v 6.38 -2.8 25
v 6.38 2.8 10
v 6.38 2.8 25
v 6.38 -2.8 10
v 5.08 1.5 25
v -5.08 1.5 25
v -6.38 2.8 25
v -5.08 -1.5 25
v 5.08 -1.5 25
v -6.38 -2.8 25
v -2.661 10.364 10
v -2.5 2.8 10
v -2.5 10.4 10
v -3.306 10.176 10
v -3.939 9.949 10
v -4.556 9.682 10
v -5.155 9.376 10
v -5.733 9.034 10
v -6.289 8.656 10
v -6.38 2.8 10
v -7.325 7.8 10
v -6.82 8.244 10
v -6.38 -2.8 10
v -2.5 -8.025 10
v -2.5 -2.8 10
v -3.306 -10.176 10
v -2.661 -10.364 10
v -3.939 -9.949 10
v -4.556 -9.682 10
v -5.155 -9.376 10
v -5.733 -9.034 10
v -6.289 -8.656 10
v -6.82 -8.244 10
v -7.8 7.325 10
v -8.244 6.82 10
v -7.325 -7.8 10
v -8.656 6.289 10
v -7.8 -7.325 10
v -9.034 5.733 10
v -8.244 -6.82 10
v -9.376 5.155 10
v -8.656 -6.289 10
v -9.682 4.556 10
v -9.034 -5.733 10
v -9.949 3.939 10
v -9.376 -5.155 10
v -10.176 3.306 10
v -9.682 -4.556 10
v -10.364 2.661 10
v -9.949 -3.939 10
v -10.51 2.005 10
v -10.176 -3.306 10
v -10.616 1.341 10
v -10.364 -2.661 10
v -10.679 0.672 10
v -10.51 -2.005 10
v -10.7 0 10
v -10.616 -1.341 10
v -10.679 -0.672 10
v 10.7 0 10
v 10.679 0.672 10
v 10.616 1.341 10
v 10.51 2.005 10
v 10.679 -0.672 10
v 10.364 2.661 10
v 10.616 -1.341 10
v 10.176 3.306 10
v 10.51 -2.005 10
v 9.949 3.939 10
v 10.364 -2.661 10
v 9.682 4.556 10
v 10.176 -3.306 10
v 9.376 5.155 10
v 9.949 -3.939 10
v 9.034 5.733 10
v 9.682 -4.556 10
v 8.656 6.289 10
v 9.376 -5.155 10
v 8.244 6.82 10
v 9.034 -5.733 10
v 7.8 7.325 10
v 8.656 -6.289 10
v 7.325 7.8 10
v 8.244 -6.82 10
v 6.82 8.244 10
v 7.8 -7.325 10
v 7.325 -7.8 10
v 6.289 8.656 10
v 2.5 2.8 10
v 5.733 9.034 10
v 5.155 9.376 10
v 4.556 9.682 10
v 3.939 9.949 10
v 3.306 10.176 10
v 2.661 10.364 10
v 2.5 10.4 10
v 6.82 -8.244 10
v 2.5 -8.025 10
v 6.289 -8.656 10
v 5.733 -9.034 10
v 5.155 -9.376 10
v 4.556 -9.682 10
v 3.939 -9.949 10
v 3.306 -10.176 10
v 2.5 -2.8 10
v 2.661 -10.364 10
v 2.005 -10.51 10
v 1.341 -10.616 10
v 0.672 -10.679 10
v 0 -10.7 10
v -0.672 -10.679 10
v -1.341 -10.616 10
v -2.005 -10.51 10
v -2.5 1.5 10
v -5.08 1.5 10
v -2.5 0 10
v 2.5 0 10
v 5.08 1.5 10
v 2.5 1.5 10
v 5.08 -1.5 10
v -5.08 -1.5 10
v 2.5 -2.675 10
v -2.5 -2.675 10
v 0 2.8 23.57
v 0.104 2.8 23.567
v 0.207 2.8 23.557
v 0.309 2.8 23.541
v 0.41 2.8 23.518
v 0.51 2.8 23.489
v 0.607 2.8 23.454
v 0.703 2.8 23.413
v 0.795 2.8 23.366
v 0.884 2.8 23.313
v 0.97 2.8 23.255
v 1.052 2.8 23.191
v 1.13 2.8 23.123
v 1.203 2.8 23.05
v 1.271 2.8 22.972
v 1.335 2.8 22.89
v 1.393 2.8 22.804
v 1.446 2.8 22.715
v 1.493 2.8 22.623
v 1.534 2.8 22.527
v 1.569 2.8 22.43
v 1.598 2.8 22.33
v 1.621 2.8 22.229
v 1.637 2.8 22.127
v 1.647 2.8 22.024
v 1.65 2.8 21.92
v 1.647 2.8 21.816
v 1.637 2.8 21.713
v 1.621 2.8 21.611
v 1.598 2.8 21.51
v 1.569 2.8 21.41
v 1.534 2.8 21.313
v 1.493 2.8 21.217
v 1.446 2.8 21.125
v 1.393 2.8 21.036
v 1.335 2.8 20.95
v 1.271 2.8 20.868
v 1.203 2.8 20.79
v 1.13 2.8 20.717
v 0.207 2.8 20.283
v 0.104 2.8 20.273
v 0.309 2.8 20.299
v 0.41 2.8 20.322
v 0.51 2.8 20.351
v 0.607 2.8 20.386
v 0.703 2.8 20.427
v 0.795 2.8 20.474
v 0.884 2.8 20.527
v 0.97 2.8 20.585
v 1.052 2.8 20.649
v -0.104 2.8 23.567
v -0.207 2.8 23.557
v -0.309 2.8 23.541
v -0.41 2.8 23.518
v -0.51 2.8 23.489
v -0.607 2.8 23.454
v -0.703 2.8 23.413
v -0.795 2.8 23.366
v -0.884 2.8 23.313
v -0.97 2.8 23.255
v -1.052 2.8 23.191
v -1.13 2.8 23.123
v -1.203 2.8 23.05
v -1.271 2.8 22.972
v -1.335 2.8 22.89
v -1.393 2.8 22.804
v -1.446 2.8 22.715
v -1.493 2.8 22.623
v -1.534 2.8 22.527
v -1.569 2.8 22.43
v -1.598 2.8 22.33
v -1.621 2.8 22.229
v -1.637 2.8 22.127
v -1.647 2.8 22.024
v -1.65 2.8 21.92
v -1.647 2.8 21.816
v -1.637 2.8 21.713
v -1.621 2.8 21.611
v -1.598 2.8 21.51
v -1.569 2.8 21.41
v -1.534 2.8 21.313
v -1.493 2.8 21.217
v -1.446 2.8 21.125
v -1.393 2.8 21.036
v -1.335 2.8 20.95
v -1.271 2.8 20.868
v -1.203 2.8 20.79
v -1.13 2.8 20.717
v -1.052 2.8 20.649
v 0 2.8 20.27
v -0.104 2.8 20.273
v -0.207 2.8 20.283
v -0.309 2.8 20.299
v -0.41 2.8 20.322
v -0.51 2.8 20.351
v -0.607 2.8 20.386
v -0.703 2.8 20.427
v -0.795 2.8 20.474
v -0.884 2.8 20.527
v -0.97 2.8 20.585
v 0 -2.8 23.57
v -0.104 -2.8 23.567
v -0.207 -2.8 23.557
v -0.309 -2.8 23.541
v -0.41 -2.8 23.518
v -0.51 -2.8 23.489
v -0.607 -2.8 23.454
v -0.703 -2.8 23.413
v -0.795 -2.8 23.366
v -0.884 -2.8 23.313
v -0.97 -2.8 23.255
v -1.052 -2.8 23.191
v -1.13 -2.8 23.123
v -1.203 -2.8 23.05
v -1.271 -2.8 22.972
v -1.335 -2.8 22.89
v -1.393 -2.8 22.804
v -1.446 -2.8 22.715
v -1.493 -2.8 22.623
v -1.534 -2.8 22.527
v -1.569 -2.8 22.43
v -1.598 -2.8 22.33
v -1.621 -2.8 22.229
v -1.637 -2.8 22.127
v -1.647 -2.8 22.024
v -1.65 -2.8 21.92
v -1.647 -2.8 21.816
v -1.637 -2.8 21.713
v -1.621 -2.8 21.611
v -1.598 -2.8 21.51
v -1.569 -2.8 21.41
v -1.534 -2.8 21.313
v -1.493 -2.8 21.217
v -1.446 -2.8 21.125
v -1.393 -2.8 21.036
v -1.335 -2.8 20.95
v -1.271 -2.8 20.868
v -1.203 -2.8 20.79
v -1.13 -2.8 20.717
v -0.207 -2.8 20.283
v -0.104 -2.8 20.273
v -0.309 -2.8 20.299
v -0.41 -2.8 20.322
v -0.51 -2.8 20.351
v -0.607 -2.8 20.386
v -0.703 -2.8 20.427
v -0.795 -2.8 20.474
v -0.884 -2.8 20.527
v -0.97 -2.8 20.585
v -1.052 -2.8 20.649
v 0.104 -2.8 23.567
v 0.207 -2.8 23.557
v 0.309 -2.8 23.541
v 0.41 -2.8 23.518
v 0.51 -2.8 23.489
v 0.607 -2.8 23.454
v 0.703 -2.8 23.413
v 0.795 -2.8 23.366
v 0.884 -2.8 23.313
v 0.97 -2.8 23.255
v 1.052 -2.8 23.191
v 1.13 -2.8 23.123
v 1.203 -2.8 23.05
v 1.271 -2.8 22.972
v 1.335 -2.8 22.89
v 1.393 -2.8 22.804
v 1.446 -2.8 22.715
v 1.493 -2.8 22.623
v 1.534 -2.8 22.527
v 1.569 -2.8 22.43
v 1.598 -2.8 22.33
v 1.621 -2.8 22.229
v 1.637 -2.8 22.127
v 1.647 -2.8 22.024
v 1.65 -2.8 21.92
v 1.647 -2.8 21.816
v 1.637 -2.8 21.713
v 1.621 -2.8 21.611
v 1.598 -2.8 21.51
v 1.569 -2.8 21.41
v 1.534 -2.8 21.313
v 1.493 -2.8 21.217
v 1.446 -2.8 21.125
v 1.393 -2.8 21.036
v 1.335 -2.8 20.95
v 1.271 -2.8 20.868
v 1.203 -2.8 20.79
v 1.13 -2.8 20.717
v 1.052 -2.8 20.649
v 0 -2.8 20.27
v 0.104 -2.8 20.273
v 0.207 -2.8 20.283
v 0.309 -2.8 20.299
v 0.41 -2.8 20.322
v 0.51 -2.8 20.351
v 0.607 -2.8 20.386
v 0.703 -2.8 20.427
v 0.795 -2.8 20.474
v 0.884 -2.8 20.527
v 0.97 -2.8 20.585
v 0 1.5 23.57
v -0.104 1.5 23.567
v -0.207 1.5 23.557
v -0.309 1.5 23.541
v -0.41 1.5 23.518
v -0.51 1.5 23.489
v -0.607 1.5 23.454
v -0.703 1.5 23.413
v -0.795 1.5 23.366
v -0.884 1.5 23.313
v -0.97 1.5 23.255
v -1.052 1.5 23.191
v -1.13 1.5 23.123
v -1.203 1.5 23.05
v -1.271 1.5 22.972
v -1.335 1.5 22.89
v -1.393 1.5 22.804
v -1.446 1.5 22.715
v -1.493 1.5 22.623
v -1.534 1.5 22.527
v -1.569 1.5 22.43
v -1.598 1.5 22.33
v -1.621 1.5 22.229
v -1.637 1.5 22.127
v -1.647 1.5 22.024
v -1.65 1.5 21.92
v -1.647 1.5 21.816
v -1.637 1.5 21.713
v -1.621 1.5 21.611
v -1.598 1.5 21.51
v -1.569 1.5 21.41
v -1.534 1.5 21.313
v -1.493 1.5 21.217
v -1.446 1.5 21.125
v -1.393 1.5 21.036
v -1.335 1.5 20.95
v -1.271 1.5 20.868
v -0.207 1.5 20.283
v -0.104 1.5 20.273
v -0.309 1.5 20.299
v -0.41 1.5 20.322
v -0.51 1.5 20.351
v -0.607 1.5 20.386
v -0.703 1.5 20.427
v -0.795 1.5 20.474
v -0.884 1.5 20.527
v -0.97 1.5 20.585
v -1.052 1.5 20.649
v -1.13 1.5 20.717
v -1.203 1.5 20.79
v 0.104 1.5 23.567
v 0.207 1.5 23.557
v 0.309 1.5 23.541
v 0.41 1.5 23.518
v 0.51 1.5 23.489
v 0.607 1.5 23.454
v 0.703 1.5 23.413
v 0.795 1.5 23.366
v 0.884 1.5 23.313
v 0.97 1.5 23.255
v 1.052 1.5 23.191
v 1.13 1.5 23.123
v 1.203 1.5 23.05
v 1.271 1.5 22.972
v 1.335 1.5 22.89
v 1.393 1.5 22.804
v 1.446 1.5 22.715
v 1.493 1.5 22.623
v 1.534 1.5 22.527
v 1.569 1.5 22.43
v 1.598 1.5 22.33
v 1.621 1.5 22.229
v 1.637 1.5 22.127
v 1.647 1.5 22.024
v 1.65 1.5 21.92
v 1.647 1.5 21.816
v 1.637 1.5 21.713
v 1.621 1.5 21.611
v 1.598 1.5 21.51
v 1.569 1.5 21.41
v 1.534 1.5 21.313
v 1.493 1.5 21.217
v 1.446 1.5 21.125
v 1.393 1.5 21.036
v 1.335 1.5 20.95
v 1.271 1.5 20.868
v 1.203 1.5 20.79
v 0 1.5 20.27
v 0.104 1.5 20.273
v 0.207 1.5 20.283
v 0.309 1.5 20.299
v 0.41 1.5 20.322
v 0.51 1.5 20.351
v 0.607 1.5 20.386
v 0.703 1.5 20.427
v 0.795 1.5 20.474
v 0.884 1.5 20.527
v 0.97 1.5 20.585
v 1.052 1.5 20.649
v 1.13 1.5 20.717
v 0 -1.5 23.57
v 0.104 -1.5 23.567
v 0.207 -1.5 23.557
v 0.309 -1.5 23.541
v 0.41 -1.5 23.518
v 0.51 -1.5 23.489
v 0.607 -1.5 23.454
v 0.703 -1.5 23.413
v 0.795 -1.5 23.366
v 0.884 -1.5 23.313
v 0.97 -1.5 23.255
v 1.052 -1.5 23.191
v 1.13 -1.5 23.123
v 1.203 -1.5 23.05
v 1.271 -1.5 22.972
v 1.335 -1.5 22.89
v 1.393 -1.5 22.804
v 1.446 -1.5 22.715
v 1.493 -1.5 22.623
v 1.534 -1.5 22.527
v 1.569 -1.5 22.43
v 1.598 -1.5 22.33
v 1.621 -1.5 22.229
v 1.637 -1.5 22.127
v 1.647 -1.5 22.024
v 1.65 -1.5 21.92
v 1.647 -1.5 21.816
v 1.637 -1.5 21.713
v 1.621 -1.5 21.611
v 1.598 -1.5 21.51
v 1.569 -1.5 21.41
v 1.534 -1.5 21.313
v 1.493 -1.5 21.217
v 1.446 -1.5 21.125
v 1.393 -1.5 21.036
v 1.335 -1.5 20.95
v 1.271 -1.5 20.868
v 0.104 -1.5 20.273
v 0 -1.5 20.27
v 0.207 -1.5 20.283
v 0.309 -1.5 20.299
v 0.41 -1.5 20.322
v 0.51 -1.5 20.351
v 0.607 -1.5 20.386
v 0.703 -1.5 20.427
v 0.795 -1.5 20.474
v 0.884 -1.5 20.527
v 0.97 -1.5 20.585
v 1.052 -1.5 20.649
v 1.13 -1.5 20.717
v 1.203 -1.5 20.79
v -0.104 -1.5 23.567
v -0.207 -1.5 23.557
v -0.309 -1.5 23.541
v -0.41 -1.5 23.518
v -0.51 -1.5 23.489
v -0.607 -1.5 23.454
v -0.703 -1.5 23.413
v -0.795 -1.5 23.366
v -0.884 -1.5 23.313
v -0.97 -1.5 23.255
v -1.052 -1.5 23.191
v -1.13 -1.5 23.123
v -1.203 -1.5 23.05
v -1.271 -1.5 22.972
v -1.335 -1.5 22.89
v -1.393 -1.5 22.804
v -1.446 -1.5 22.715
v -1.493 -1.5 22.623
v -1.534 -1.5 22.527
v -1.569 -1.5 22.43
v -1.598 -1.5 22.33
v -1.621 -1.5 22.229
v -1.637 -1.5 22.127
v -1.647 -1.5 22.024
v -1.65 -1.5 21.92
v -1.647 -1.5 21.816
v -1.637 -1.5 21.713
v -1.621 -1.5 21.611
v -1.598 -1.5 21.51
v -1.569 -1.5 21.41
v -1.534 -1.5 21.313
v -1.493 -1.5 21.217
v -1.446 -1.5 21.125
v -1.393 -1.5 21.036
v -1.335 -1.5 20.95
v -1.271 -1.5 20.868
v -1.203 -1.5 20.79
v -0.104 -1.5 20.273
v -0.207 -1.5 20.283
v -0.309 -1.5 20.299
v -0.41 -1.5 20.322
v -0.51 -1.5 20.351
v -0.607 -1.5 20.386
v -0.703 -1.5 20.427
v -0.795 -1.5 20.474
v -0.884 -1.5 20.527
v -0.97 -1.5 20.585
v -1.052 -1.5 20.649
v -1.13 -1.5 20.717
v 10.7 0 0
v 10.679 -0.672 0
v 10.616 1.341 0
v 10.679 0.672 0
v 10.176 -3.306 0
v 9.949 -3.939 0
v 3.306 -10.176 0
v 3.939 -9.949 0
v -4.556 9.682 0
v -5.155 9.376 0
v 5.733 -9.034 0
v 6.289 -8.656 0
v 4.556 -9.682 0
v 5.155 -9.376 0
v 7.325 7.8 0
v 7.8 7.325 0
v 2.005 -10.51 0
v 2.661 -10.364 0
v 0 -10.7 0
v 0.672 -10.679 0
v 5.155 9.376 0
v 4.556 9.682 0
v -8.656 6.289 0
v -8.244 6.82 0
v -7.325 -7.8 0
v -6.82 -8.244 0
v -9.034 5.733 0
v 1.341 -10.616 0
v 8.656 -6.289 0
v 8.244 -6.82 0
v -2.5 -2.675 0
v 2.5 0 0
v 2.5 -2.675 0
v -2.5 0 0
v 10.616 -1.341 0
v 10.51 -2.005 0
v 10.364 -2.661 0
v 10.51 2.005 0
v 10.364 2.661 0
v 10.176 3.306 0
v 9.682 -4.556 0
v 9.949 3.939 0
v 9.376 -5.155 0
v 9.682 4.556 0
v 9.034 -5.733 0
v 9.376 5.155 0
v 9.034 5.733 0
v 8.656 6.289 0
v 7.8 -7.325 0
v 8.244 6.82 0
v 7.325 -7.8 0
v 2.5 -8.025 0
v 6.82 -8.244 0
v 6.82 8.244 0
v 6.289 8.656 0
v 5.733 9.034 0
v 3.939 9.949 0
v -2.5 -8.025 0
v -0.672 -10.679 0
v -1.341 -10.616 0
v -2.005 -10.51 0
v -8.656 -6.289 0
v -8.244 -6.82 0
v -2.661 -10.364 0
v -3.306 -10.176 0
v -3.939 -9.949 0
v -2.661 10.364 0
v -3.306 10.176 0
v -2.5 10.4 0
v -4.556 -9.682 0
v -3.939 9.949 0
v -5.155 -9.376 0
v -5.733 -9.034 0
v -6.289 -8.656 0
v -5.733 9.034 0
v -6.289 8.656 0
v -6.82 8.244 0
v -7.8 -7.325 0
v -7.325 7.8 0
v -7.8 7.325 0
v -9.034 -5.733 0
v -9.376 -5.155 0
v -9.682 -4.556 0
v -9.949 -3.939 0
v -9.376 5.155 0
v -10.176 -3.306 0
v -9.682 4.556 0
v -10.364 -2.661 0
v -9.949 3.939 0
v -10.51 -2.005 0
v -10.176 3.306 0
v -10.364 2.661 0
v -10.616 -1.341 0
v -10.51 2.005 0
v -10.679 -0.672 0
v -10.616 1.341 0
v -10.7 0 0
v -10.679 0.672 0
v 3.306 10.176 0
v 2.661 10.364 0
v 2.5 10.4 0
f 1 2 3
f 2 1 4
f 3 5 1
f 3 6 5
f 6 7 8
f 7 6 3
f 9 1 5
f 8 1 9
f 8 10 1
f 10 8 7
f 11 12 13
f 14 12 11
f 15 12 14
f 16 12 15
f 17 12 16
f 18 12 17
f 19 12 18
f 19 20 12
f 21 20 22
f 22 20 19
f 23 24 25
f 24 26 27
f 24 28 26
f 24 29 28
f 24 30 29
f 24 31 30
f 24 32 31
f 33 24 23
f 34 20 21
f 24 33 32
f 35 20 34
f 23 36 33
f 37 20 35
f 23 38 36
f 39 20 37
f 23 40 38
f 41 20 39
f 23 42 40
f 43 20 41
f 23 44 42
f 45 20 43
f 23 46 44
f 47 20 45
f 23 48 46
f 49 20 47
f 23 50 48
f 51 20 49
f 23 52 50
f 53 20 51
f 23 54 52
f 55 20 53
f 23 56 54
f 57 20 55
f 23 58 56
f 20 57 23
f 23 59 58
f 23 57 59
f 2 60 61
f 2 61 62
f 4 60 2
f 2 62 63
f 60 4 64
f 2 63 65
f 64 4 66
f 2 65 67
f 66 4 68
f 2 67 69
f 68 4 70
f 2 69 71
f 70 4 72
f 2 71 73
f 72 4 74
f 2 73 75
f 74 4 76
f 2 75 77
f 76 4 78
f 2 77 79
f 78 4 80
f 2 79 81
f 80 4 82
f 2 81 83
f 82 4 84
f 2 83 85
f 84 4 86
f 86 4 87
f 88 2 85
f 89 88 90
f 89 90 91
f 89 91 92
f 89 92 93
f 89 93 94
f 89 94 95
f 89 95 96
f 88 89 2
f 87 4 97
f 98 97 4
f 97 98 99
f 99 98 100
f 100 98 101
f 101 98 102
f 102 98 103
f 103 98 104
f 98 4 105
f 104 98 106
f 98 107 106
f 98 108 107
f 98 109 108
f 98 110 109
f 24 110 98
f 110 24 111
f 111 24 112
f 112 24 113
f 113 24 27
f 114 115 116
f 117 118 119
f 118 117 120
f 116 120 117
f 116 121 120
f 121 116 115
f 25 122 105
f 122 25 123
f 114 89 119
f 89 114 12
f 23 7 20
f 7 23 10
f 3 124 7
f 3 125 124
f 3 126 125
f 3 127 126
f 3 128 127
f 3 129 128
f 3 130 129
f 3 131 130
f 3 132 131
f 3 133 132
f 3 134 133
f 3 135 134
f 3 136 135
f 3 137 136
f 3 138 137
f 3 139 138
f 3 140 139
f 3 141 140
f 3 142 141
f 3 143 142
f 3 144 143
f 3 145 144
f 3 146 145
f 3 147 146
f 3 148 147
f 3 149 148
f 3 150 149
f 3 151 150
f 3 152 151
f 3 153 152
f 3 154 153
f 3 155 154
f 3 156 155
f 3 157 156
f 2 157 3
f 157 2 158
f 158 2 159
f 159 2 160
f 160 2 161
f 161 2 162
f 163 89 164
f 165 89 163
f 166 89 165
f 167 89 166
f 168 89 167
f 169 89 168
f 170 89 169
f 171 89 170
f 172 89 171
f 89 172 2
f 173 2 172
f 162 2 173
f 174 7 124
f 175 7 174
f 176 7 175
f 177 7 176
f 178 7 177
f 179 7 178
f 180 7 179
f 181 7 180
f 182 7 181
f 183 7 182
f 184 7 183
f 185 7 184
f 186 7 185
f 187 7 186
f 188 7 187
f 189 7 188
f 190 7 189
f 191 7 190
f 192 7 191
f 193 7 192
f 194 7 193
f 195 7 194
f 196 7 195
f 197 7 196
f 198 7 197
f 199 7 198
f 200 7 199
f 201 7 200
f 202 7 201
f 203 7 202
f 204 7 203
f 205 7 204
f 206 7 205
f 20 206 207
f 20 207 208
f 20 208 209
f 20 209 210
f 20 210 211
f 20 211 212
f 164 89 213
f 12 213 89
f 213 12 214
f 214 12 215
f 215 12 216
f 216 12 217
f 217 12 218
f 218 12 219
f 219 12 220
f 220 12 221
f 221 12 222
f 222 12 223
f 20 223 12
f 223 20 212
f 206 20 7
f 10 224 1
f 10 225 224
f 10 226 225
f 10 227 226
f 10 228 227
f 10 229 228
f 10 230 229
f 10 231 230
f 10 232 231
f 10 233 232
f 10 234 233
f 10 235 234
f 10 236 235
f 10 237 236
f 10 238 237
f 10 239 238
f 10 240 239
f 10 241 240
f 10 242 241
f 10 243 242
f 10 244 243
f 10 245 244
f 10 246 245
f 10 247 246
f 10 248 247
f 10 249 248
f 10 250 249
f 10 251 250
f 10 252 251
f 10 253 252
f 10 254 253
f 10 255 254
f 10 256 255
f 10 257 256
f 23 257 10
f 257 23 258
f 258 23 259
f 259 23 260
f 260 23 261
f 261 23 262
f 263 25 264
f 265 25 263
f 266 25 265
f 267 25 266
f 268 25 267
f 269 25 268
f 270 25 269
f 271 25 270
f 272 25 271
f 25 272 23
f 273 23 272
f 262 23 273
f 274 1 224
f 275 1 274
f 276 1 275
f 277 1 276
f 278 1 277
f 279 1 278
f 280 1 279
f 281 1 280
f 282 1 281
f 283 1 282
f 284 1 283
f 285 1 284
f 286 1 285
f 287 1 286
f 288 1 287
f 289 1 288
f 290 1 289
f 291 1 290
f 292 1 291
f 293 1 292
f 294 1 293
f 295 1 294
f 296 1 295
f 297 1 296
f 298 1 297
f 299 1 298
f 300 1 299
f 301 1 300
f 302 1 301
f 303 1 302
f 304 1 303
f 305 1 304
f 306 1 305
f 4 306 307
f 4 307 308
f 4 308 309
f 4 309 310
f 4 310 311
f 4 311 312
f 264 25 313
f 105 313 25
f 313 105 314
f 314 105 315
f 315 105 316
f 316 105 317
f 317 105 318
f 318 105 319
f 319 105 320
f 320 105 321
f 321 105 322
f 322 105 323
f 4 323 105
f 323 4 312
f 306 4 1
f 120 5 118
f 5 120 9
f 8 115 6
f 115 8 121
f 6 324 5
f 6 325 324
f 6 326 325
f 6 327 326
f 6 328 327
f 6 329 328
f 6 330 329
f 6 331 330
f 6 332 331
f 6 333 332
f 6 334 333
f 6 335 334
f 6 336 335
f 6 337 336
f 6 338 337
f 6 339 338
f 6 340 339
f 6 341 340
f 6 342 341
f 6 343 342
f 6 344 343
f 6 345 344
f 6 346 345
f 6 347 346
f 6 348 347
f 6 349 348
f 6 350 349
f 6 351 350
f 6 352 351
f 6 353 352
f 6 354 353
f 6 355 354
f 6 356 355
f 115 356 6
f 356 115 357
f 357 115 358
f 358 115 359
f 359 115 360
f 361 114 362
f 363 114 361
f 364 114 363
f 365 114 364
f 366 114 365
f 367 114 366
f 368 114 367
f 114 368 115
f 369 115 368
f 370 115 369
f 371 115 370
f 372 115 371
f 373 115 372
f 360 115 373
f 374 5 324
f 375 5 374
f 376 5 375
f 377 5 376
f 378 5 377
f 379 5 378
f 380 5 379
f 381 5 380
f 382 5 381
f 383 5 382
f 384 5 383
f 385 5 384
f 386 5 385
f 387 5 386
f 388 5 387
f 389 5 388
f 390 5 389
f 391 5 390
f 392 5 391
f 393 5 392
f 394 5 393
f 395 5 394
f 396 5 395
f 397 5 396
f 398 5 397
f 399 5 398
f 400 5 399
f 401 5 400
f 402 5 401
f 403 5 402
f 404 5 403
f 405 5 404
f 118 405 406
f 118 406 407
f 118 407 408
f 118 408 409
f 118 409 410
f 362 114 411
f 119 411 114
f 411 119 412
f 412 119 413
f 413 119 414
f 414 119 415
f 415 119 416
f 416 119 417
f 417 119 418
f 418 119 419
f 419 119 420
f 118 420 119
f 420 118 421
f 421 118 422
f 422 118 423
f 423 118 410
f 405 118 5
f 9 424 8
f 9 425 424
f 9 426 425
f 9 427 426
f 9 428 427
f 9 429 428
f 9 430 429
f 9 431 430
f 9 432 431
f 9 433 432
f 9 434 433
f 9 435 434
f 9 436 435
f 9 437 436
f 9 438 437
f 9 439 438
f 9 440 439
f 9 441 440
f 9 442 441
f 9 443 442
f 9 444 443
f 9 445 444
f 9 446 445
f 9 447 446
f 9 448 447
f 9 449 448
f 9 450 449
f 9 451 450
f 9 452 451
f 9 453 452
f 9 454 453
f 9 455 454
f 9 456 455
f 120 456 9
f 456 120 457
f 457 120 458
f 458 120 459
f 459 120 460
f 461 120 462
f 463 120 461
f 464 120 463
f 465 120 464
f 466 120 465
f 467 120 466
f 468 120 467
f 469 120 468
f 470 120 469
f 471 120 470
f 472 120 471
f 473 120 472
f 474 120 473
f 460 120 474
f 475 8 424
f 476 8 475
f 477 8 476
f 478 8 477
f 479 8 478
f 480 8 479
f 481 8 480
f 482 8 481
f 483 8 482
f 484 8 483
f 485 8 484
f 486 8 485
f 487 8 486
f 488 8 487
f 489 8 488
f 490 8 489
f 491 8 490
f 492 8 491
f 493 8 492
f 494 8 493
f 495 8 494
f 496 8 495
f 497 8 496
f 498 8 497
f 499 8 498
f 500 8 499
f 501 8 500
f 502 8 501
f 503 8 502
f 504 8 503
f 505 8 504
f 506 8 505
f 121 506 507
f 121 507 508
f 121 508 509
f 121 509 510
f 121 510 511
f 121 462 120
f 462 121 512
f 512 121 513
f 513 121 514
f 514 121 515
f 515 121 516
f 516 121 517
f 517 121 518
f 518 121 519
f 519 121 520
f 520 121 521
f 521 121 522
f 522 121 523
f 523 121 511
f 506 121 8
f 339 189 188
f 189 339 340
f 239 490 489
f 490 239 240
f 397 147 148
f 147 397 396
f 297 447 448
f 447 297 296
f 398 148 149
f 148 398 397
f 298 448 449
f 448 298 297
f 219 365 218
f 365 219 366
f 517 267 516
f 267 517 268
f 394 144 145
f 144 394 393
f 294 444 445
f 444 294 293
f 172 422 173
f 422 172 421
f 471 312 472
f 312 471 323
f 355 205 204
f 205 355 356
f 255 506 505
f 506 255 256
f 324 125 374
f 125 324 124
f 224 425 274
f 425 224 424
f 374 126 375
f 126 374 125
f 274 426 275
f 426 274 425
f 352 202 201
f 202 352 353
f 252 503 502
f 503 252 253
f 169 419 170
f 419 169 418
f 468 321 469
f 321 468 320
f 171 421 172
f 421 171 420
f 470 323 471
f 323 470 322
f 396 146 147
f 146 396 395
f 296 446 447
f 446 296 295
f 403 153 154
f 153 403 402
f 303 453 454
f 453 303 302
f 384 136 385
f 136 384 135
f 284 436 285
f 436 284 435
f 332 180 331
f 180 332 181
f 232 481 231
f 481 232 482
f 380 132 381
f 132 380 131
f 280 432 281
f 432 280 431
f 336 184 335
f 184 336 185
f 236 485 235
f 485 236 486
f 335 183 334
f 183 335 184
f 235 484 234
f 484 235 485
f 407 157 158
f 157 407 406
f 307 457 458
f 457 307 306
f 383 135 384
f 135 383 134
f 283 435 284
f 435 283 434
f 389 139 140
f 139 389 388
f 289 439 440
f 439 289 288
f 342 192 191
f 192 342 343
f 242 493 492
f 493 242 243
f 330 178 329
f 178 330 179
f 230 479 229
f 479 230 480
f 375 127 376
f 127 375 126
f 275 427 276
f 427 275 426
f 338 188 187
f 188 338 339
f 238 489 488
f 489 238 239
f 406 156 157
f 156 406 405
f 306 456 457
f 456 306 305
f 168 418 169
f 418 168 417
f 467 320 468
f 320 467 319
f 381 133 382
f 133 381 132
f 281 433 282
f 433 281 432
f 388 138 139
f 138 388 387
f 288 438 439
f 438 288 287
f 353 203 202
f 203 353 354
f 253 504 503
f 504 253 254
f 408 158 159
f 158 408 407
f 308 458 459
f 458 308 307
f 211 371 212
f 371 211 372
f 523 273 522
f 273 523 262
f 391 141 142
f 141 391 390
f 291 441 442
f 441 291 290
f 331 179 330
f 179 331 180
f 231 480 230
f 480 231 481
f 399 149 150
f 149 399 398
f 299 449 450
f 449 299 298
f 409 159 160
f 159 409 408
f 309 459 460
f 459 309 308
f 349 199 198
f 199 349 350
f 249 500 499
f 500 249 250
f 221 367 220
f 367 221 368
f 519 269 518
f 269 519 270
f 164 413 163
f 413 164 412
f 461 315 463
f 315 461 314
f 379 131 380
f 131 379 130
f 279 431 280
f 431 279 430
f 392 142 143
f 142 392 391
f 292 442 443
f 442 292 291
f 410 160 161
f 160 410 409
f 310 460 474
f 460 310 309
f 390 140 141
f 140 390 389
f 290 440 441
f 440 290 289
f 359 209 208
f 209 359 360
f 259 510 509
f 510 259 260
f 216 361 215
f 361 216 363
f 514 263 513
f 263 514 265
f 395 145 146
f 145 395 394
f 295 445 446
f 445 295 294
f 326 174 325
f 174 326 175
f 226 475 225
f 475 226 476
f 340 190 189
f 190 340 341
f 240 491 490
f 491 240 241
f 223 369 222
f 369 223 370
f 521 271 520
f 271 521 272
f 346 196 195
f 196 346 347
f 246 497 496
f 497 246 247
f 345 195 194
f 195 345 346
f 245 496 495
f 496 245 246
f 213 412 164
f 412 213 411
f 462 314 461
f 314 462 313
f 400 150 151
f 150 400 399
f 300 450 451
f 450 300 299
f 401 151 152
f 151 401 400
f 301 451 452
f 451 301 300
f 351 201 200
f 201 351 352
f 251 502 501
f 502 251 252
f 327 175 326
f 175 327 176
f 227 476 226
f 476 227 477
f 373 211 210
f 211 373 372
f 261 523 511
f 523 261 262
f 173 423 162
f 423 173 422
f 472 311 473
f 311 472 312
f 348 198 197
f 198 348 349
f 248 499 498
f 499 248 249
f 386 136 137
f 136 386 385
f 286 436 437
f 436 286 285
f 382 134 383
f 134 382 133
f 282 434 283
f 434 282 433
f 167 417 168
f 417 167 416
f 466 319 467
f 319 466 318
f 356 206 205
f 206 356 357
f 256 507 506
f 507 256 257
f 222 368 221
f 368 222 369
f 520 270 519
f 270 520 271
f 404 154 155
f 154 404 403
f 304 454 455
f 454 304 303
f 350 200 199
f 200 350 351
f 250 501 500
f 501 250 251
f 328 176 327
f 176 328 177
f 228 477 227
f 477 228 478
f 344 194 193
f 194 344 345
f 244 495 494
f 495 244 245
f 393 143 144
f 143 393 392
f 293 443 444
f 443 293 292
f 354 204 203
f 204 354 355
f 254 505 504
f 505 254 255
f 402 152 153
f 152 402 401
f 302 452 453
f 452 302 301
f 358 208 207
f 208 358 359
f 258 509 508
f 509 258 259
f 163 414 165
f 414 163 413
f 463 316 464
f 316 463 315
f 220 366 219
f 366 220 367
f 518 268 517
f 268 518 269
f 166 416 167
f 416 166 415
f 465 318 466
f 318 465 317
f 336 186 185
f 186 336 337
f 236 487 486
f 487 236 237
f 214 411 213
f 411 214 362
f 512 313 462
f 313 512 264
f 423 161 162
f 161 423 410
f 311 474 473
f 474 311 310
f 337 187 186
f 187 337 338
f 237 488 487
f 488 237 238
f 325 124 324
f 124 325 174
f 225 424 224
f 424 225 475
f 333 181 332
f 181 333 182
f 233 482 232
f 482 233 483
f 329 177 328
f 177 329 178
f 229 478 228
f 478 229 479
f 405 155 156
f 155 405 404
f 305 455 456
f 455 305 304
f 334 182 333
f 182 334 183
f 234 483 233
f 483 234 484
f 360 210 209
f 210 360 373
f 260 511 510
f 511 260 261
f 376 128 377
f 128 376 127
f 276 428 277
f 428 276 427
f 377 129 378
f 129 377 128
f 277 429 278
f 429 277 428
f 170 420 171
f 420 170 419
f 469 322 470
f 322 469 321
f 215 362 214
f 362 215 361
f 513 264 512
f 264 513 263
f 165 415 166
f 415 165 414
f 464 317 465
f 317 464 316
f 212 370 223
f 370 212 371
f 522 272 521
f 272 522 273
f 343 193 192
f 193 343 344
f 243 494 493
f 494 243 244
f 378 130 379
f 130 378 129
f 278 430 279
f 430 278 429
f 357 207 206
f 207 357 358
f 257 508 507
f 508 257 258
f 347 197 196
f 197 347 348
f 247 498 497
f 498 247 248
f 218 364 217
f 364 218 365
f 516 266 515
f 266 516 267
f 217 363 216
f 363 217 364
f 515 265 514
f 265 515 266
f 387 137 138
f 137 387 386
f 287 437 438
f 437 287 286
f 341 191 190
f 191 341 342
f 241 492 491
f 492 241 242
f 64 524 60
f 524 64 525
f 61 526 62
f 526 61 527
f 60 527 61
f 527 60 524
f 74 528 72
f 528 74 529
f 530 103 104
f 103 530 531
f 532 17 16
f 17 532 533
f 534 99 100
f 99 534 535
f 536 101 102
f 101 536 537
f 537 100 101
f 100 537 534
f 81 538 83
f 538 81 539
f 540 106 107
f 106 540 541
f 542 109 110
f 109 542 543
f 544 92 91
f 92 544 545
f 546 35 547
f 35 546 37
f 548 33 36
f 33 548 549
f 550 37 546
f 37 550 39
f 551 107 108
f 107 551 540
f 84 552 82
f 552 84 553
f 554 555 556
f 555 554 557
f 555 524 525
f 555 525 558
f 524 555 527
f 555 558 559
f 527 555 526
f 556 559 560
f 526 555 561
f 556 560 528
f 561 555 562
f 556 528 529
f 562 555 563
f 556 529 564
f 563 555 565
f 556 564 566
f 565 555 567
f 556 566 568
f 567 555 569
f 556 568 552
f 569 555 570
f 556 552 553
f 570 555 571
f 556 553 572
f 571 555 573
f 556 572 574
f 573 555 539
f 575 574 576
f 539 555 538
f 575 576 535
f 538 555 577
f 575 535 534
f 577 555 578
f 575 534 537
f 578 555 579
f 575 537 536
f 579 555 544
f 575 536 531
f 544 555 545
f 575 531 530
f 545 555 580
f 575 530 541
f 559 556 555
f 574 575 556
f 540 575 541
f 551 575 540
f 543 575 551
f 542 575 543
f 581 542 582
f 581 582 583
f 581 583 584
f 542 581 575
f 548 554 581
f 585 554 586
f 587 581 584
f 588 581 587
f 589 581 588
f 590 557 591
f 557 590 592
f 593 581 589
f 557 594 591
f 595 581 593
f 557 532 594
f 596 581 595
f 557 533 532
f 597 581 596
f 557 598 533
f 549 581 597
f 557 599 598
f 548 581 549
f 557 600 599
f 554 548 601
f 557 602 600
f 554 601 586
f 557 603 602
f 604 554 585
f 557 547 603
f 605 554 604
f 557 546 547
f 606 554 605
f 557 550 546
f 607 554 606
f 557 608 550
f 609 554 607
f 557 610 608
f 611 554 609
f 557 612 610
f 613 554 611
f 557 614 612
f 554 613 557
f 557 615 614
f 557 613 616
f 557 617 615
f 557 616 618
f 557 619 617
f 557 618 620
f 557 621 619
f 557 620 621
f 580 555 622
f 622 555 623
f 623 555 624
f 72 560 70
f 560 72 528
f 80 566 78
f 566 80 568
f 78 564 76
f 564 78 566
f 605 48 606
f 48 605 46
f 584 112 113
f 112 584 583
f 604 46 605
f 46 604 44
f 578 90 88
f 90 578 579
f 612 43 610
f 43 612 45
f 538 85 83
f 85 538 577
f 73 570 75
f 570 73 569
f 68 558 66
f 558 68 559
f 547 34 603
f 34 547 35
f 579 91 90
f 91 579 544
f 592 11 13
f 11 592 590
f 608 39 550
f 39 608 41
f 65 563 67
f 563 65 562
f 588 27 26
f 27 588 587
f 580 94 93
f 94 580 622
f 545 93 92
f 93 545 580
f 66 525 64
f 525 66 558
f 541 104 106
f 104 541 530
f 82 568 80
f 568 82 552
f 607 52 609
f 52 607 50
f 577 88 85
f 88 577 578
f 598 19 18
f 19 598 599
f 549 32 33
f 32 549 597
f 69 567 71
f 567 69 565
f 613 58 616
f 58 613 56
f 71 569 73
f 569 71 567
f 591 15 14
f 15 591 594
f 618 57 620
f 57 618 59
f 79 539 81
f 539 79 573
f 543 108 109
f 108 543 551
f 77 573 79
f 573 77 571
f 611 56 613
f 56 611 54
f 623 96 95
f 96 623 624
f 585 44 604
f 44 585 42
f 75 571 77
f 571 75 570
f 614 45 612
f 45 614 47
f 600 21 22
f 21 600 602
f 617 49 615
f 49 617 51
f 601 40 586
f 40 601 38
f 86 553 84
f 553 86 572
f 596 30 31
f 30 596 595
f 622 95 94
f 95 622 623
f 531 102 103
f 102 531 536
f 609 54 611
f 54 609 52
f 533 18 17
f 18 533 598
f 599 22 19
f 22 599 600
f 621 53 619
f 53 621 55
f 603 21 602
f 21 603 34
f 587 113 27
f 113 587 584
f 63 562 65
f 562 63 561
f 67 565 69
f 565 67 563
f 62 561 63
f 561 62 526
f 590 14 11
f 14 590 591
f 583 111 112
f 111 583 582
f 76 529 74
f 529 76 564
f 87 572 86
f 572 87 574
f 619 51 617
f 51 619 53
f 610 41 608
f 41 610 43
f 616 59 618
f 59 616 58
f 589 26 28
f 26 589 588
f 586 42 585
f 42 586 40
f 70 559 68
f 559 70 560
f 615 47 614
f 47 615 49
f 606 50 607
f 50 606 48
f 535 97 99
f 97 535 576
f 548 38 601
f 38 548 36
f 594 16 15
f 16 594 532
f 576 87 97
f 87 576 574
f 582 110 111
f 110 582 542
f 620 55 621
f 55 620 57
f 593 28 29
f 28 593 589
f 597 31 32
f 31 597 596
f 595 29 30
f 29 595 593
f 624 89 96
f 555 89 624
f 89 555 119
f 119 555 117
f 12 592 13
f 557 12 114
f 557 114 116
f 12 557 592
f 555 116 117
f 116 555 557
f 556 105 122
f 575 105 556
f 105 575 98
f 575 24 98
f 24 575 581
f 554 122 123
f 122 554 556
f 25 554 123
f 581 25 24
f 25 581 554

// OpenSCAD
// file: ../configuration.scad
$fn=40; // model faces resolution.

//Parametry pro D01 a D02
//nastavení držáku na sloup
//Parametry pro D5
//----------------------------------------------------------------
//----------------------------------------------------------------


S01_sila_materialu=1.3; //sila výztuhy

//D01 - uchyt velky
D01_material_pod_zavitem=5;
D01_material_za_zavitem=3;
D01_material_pred_zavitem=2;
D01_delka_tyce=30;
D01_sirka_tyce=15;

//D02 - uchyt na sloup
D02_sila_materialu=5;
D02_vyska_uchytky=40;
D02_prumer_obruby=27; 
//27mm - 3/4 trubka
D02_delka_celeho_uchytu=64;
D02_dotahova_vzdalenost=1.5;
D02_prumer_uchytneho_sroubu=4.2;
D02_sirka_matky=9.1; //pro M4
D02_vyska_matky=3;


D05_vyska_drzaku_senzoru=15;
D05_prumer_zkumavky_vnitrni=21.4;
D05_vyska_podstavce=10;
D05_sirka_otvoru_na_kabel=5;




//není potřeba měnit
S01_prumer_vnitrni=40;
S01_tolerance_zavit=1.5;
// main file
$fn=40; // model faces resolution.
include <../configuration.scad>


//Drzak senzoru
module ISLHOLDER01A_D05()
    {
    translate([0,0,(D05_vyska_drzaku_senzoru)/2+D05_vyska_podstavce])
        difference()
            {
            cube([10.16+2*S01_sila_materialu,3+2*S01_sila_materialu,D05_vyska_drzaku_senzoru],true);

            cube([10.16,3,D05_vyska_drzaku_senzoru+0.01],true);
            
            translate([0,5,D05_vyska_drzaku_senzoru/2-3.08])
                rotate ([90,0,0])
                    cylinder (h = 30, r=(3.3/2), $fn=100);
            
            }
            
   difference()
        {         
        cylinder (h = D05_vyska_podstavce, r=D05_prumer_zkumavky_vnitrni/2, $fn=100);
        
        translate([0,D05_prumer_zkumavky_vnitrni/4,D05_vyska_podstavce/2])  
            cube([D05_sirka_otvoru_na_kabel,D05_prumer_zkumavky_vnitrni/2,D05_vyska_podstavce+0.11],true); 
         
          rotate ([0,0,180])   
         translate([0,D05_prumer_zkumavky_vnitrni*1/4,D05_vyska_podstavce/2])  
            cube([D05_sirka_otvoru_na_kabel,D05_prumer_zkumavky_vnitrni/4,D05_vyska_podstavce+0.11],true);     
            
       }
    }

ISLHOLDER01A_D05();
